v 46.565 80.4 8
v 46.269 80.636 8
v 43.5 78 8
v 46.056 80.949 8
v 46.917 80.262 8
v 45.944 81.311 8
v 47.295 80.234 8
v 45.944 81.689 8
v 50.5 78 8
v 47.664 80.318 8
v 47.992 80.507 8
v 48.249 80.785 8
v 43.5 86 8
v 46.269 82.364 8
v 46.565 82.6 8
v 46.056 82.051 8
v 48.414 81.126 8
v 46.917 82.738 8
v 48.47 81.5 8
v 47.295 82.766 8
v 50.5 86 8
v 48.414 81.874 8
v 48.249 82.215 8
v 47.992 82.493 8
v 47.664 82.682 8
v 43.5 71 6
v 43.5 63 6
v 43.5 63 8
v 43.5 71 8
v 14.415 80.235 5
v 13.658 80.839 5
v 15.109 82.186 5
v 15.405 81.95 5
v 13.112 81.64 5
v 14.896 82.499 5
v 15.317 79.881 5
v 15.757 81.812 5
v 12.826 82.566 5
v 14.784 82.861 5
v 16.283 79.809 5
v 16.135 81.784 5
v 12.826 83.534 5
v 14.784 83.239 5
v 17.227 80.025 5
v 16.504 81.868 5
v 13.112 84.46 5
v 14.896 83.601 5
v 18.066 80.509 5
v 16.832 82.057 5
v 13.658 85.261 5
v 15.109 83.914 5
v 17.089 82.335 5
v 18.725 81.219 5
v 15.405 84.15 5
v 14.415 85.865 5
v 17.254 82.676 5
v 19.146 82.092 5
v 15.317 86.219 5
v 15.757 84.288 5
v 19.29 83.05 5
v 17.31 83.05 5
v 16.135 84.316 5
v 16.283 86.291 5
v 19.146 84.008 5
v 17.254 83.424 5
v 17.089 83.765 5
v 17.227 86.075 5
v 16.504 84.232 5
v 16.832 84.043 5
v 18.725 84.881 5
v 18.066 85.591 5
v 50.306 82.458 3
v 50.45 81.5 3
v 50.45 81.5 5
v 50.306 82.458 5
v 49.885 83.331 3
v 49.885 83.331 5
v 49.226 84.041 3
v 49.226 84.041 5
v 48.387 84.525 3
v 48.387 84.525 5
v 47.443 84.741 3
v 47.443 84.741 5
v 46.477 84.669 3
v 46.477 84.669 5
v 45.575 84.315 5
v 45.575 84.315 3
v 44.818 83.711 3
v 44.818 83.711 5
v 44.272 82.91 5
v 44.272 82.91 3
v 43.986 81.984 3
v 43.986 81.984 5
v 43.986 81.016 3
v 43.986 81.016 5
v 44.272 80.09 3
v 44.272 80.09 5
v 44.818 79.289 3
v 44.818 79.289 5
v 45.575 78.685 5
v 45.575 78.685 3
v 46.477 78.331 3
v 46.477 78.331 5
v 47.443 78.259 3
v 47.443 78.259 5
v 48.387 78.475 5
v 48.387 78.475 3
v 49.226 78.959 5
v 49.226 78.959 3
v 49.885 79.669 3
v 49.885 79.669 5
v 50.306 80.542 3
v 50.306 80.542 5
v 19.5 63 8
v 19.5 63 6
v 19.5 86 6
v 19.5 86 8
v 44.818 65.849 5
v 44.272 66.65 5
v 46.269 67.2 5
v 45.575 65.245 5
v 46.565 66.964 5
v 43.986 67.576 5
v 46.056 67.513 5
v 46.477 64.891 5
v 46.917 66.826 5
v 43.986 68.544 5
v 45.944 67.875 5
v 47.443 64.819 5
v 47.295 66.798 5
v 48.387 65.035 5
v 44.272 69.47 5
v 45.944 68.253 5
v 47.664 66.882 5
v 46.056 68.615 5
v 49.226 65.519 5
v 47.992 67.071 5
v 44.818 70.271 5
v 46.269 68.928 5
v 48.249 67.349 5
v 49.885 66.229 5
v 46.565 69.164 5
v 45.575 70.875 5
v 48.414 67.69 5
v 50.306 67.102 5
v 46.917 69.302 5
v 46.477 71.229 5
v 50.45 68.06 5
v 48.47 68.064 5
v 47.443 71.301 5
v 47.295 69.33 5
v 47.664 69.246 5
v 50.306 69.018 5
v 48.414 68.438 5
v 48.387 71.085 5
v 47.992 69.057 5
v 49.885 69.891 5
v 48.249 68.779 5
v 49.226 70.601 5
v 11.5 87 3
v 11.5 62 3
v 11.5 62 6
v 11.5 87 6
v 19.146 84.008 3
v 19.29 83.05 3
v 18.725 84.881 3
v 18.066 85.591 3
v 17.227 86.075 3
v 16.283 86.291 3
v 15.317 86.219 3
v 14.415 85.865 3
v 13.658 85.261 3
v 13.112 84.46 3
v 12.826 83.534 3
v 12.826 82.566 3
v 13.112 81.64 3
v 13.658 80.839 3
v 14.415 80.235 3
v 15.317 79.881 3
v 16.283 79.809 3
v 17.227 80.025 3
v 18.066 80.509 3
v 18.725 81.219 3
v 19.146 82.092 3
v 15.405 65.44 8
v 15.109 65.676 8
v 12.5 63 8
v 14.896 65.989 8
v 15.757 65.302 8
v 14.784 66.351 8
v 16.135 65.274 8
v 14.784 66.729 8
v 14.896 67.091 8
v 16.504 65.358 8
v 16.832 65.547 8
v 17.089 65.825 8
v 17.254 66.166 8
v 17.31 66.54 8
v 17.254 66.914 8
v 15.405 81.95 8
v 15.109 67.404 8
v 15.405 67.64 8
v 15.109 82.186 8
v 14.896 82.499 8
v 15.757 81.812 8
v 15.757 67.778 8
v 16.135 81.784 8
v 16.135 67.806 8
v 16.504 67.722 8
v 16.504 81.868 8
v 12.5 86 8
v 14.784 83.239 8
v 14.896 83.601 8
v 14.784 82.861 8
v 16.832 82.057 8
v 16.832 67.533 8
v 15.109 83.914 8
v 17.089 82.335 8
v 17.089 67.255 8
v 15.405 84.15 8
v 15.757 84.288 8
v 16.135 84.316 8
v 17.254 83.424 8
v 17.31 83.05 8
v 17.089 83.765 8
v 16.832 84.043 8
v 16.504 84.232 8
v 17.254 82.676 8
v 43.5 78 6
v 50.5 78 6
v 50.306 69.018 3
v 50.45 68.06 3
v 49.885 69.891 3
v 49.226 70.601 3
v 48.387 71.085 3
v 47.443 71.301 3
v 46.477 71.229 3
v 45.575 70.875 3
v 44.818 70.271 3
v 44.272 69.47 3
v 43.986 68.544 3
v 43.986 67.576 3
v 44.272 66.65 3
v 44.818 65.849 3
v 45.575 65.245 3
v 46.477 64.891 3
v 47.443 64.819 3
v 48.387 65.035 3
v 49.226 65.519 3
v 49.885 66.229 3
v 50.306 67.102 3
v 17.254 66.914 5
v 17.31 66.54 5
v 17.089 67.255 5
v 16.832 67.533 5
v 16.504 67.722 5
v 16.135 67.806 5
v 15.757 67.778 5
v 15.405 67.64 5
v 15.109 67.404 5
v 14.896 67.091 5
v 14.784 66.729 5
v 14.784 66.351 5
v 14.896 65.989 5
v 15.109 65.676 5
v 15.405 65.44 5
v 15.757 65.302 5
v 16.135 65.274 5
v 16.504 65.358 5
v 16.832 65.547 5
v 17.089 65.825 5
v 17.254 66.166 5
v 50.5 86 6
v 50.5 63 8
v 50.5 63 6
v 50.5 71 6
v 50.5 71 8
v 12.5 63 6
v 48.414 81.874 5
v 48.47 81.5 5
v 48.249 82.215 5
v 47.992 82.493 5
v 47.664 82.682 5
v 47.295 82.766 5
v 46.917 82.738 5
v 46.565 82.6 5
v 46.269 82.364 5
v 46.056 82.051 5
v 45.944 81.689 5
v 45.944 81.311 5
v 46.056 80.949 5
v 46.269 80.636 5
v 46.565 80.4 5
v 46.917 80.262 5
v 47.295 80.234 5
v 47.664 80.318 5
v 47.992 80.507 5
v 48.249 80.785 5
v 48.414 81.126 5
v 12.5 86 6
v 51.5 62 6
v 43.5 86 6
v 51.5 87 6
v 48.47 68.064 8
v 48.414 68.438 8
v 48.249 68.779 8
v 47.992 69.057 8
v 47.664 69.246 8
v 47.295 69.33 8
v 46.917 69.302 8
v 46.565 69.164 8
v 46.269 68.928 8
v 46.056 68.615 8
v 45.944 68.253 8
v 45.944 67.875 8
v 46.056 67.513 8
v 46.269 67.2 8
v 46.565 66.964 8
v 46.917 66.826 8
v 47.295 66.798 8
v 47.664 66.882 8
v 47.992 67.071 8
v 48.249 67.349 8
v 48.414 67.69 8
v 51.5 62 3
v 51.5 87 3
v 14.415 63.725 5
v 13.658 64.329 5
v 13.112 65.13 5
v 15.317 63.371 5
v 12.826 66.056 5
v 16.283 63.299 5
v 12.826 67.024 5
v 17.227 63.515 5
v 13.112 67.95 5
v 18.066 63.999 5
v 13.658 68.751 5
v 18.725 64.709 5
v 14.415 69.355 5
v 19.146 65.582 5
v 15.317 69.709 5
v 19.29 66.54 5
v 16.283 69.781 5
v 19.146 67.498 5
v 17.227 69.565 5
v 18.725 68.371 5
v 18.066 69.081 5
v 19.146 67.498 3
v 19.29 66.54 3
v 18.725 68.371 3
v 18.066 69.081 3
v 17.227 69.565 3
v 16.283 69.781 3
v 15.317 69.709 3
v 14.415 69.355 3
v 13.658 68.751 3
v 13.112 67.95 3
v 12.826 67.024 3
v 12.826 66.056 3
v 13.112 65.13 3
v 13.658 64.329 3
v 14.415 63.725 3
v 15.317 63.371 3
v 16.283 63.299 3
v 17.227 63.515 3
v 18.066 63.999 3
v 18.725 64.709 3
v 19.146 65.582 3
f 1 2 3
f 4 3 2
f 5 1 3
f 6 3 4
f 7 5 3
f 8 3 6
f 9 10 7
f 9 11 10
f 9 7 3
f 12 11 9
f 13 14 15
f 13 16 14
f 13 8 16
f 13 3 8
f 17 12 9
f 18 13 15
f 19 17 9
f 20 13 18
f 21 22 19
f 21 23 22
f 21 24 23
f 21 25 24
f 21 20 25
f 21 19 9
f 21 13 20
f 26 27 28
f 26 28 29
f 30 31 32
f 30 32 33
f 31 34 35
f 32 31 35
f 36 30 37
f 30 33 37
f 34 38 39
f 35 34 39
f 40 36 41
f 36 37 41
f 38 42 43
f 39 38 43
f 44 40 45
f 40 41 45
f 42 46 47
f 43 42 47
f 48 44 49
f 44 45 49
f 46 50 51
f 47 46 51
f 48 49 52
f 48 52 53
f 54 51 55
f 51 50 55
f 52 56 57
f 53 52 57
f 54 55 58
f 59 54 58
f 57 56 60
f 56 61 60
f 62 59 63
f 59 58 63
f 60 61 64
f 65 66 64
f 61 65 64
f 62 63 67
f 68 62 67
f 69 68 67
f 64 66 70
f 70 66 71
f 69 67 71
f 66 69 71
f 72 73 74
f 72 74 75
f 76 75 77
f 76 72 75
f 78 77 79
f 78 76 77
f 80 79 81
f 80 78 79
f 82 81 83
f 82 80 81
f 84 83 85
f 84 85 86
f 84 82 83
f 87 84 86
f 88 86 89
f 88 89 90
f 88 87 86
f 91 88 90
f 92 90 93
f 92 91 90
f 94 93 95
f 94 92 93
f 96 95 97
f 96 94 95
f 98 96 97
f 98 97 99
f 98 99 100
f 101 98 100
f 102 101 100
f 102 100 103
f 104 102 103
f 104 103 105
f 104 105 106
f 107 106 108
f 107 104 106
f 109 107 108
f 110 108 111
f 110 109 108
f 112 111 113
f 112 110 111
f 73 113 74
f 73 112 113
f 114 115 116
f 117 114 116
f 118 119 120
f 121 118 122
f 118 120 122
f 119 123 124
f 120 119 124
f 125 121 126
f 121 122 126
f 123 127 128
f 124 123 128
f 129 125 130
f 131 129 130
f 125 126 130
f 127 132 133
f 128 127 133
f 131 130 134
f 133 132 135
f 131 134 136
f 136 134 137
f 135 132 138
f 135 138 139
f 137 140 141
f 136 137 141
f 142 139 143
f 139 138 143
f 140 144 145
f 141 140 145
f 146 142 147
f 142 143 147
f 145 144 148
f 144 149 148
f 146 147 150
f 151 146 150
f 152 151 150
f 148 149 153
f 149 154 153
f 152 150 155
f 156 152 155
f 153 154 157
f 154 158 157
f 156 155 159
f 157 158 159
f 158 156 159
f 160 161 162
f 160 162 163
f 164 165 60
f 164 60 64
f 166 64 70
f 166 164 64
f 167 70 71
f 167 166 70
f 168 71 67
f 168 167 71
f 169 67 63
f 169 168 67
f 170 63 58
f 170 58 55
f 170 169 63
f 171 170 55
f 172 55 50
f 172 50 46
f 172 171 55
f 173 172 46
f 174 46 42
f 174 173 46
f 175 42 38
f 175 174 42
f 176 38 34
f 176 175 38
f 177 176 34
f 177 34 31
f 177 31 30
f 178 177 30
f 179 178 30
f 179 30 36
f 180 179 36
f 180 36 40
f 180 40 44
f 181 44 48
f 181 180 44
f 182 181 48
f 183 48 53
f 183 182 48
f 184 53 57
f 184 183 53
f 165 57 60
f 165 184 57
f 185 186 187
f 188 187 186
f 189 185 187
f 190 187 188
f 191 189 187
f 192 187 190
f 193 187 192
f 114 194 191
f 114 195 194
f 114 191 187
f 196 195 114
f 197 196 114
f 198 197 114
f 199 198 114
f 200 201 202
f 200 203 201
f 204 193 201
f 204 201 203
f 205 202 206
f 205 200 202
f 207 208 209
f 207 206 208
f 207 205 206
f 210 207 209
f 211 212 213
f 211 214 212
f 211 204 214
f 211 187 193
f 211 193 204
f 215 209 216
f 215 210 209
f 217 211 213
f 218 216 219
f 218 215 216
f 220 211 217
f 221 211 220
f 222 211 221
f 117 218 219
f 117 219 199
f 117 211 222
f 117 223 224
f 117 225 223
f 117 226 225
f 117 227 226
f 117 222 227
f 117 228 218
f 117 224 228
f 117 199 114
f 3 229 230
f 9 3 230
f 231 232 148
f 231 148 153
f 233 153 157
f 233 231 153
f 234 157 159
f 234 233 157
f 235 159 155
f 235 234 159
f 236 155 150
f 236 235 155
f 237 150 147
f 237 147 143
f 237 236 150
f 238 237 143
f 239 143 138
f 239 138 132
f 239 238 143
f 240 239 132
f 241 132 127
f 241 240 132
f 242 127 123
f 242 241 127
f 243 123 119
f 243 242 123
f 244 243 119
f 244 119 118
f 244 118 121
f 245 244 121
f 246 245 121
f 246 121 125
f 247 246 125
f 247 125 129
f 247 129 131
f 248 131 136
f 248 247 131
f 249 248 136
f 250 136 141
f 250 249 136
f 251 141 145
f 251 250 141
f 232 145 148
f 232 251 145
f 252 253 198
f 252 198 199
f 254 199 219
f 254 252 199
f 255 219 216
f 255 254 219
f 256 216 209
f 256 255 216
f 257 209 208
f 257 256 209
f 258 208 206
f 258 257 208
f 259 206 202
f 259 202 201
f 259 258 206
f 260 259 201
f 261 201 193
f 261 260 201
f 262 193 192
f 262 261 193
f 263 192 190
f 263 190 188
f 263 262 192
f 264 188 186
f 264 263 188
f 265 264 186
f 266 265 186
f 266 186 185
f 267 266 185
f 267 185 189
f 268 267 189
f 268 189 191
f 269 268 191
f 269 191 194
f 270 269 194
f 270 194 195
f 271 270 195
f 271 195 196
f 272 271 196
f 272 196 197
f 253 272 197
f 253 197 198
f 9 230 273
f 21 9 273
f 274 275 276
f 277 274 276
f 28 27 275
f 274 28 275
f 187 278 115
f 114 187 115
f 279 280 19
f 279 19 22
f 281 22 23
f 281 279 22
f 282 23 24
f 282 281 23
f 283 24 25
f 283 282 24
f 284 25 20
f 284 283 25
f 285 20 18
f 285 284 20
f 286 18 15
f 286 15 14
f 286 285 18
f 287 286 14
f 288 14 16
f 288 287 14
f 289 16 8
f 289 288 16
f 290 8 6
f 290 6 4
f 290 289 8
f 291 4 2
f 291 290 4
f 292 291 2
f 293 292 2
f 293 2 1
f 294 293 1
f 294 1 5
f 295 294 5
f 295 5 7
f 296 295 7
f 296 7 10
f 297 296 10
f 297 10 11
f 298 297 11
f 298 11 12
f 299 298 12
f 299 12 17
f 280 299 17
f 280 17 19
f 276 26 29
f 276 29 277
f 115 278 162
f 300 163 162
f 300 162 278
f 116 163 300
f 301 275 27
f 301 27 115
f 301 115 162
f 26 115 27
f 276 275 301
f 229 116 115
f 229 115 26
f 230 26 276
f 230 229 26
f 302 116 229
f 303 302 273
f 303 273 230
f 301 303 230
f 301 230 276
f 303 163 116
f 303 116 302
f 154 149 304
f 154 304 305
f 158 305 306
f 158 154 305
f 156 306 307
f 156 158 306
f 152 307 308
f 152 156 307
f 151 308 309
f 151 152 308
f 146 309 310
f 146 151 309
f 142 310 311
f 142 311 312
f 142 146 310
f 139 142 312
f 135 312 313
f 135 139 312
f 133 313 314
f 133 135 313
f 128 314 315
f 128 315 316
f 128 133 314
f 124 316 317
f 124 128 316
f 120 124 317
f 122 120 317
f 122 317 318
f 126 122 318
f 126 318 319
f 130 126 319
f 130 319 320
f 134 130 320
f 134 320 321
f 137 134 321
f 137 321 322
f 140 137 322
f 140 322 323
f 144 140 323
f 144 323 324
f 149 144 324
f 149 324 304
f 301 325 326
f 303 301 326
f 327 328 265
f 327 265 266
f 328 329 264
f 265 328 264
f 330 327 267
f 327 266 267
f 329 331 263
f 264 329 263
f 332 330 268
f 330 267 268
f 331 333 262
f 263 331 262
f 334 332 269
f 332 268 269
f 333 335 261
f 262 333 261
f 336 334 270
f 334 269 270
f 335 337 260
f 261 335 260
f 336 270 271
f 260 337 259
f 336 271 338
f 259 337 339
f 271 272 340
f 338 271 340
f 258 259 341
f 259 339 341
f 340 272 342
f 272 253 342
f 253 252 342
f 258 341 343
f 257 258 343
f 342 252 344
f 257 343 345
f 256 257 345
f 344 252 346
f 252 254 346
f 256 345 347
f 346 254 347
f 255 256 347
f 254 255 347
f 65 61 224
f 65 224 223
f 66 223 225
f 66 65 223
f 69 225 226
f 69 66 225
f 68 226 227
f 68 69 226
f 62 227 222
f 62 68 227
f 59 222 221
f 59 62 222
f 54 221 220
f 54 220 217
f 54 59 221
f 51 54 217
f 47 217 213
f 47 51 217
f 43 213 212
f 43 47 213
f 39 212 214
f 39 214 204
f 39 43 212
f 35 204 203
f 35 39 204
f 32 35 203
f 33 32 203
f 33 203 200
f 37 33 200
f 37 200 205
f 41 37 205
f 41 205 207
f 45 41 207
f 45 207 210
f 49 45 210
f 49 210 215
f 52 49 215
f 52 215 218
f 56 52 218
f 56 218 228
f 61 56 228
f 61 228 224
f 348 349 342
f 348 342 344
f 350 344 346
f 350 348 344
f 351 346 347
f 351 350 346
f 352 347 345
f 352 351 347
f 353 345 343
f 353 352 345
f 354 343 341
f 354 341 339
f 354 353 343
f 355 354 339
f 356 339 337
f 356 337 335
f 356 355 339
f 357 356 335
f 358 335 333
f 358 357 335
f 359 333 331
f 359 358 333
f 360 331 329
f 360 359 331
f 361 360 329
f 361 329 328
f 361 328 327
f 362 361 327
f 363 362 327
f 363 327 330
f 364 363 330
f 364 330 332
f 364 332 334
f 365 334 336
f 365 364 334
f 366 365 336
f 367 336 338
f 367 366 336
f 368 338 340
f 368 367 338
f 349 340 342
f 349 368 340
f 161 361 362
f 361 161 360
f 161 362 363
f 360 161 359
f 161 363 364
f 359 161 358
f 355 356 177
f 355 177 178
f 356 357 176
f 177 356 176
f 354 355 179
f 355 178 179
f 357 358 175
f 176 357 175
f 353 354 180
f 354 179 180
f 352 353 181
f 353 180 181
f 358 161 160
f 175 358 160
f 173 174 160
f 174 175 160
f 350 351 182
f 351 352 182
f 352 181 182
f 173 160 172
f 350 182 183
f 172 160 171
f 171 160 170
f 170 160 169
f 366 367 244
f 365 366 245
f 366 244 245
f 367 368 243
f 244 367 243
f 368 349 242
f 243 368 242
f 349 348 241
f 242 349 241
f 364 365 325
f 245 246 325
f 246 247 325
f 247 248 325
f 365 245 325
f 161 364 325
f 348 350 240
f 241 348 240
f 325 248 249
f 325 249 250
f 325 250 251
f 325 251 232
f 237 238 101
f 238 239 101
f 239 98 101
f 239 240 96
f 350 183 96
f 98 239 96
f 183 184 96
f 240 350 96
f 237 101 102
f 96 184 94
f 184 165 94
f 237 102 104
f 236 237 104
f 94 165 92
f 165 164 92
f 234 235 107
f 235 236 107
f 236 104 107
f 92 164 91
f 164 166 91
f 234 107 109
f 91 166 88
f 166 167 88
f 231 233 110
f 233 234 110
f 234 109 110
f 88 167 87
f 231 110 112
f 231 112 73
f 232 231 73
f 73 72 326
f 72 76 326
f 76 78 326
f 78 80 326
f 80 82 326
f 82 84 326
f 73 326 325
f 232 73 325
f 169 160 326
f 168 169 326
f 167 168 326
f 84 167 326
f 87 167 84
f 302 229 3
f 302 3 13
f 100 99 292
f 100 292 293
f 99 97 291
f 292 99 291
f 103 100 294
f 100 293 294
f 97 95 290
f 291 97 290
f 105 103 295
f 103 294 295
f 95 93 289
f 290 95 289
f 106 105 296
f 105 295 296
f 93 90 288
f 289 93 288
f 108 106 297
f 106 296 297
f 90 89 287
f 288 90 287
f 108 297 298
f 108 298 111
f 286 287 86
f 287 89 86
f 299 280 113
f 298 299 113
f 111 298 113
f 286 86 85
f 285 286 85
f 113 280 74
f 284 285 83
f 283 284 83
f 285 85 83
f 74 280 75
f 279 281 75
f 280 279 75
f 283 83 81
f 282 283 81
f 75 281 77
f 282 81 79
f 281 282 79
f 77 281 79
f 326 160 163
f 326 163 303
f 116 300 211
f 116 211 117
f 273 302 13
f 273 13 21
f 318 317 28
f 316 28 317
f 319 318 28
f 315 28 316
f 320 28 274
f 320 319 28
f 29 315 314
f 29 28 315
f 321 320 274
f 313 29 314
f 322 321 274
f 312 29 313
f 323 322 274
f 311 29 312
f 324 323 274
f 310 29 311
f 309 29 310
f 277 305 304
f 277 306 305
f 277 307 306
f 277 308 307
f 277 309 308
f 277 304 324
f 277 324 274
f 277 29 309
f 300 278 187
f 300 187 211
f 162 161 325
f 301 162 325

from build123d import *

# Parameters (mm, degrees)
CYLINDER040_R     = 3.25
CYLINDER040_DEPTH = 2
CYLINDER041_R     = 3.25
CYLINDER041_DEPTH = 2
CYLINDER042_R     = 3.25
CYLINDER042_DEPTH = 2
CYLINDER039_R     = 3.25
CYLINDER039_DEPTH = 2
CYLINDER035_R     = 1.27
CYLINDER035_DEPTH = 5
CYLINDER037_R     = 1.27
CYLINDER037_DEPTH = 5
CYLINDER038_R     = 1.27
CYLINDER038_DEPTH = 5
CYLINDER036_R     = 1.27
CYLINDER036_DEPTH = 5
BOX021_W          = 7
BOX021_H          = 8
BOX021_DEPTH      = 2
BOX022_W          = 7
BOX022_H          = 8
BOX022_DEPTH      = 2
BOX020_W          = 7
BOX020_H          = 23
BOX020_DEPTH      = 2
BOX019_W          = 40
BOX019_H          = 25
BOX019_DEPTH      = 3


with BuildPart() as cylinder040:
    # Cylinder040 → Cylinder040 (new body)
    with BuildSketch(Plane(origin=(3.54, 3.54, 0), x_dir=(1, 0, 0), z_dir=(0, 0, 1))):
        Circle(CYLINDER040_R)
    extrude(amount=CYLINDER040_DEPTH)


with BuildPart() as cylinder041:
    # Cylinder041 → Cylinder041 (new body)
    with BuildSketch(Plane(origin=(34.7, 18.5, 0), x_dir=(1, 0, 0), z_dir=(0, 0, 1))):
        Circle(CYLINDER041_R)
    extrude(amount=CYLINDER041_DEPTH)


with BuildPart() as cylinder042:
    # Cylinder042 → Cylinder042 (new body)
    with BuildSketch(Plane(origin=(34.7, 5.06, 0), x_dir=(1, 0, 0), z_dir=(0, 0, 1))):
        Circle(CYLINDER042_R)
    extrude(amount=CYLINDER042_DEPTH)


with BuildPart() as washer_bolt_holes:
    # Cylinder039 → Cylinder039 (new body)
    with BuildSketch(Plane(origin=(3.54, 20.05, 0), x_dir=(1, 0, 0), z_dir=(0, 0, 1))):
        Circle(CYLINDER039_R)
    extrude(amount=CYLINDER039_DEPTH)

    # Fusion023: union Cylinder040, Cylinder041, Cylinder042
    add(cylinder040.part)
    add(cylinder041.part)
    add(cylinder042.part)


with BuildPart() as cylinder035:
    # Cylinder035 → Cylinder035 (new body)
    with BuildSketch(Plane(origin=(2.54, 19.05, 0), x_dir=(1, 0, 0), z_dir=(0, 0, 1))):
        Circle(CYLINDER035_R)
    extrude(amount=CYLINDER035_DEPTH)


with BuildPart() as cylinder037:
    # Cylinder037 → Cylinder037 (new body)
    with BuildSketch(Plane(origin=(33.7, 17.5, 0), x_dir=(1, 0, 0), z_dir=(0, 0, 1))):
        Circle(CYLINDER037_R)
    extrude(amount=CYLINDER037_DEPTH)


with BuildPart() as cylinder038:
    # Cylinder038 → Cylinder038 (new body)
    with BuildSketch(Plane(origin=(33.7, 4.064, 0), x_dir=(1, 0, 0), z_dir=(0, 0, 1))):
        Circle(CYLINDER038_R)
    extrude(amount=CYLINDER038_DEPTH)


with BuildPart() as complete_blackplate_holes:
    # Cylinder036 → Cylinder036 (new body)
    with BuildSketch(Plane(origin=(2.54, 2.54, 0), x_dir=(1, 0, 0), z_dir=(0, 0, 1))):
        Circle(CYLINDER036_R)
    extrude(amount=CYLINDER036_DEPTH)

    # Fusion021: union Cylinder035, Cylinder037, Cylinder038
    add(cylinder035.part)
    add(cylinder037.part)
    add(cylinder038.part)


with BuildPart() as complete_blackplate_holes_1:
    # Fusion021 placement: moved
    add(complete_blackplate_holes.part.moved(Location((1, 1, 0))))

    # Fusion024: union Washer Bolt Holes
    add(washer_bolt_holes.part)


with BuildPart() as cube012:
    # Box021 → Box021 (new body)
    with BuildSketch(Plane(origin=(31, 15, 3), x_dir=(1, 0, 0), z_dir=(0, 0, 1))):
        with Locations((3.5, 4)):
            Rectangle(BOX021_W, BOX021_H)
    extrude(amount=BOX021_DEPTH)


with BuildPart() as cube013:
    # Box022 → Box022 (new body)
    with BuildSketch(Plane(origin=(31, 0, 3), x_dir=(1, 0, 0), z_dir=(0, 0, 1))):
        with Locations((3.5, 4)):
            Rectangle(BOX022_W, BOX022_H)
    extrude(amount=BOX022_DEPTH)


with BuildPart() as standoff_blocks:
    # Box020 → Box020 (new body)
    with BuildSketch(Plane.XY.offset(3)):
        with Locations((3.5, 11.5)):
            Rectangle(BOX020_W, BOX020_H)
    extrude(amount=BOX020_DEPTH)

    # Fusion022: union Cube012, Cube013
    add(cube012.part)
    add(cube013.part)


with BuildPart() as regulator_base:
    # Box019 → Box019 (new body)
    with BuildSketch(Plane(origin=(-1, -1, 0), x_dir=(1, 0, 0), z_dir=(0, 0, 1))):
        with Locations((20, 12.5)):
            Rectangle(BOX019_W, BOX019_H)
    extrude(amount=BOX019_DEPTH)

    # Fusion025: union Standoff Blocks
    add(standoff_blocks.part)

    # Cut012: cut Complete Blackplate Holes
    add(complete_blackplate_holes_1.part, mode=Mode.SUBTRACT)


with BuildPart() as regulator_base_1:
    # Cut012 placement: moved
    add(regulator_base.part.moved(Location((12.5, 63, 3))))


solid = regulator_base_1.part
